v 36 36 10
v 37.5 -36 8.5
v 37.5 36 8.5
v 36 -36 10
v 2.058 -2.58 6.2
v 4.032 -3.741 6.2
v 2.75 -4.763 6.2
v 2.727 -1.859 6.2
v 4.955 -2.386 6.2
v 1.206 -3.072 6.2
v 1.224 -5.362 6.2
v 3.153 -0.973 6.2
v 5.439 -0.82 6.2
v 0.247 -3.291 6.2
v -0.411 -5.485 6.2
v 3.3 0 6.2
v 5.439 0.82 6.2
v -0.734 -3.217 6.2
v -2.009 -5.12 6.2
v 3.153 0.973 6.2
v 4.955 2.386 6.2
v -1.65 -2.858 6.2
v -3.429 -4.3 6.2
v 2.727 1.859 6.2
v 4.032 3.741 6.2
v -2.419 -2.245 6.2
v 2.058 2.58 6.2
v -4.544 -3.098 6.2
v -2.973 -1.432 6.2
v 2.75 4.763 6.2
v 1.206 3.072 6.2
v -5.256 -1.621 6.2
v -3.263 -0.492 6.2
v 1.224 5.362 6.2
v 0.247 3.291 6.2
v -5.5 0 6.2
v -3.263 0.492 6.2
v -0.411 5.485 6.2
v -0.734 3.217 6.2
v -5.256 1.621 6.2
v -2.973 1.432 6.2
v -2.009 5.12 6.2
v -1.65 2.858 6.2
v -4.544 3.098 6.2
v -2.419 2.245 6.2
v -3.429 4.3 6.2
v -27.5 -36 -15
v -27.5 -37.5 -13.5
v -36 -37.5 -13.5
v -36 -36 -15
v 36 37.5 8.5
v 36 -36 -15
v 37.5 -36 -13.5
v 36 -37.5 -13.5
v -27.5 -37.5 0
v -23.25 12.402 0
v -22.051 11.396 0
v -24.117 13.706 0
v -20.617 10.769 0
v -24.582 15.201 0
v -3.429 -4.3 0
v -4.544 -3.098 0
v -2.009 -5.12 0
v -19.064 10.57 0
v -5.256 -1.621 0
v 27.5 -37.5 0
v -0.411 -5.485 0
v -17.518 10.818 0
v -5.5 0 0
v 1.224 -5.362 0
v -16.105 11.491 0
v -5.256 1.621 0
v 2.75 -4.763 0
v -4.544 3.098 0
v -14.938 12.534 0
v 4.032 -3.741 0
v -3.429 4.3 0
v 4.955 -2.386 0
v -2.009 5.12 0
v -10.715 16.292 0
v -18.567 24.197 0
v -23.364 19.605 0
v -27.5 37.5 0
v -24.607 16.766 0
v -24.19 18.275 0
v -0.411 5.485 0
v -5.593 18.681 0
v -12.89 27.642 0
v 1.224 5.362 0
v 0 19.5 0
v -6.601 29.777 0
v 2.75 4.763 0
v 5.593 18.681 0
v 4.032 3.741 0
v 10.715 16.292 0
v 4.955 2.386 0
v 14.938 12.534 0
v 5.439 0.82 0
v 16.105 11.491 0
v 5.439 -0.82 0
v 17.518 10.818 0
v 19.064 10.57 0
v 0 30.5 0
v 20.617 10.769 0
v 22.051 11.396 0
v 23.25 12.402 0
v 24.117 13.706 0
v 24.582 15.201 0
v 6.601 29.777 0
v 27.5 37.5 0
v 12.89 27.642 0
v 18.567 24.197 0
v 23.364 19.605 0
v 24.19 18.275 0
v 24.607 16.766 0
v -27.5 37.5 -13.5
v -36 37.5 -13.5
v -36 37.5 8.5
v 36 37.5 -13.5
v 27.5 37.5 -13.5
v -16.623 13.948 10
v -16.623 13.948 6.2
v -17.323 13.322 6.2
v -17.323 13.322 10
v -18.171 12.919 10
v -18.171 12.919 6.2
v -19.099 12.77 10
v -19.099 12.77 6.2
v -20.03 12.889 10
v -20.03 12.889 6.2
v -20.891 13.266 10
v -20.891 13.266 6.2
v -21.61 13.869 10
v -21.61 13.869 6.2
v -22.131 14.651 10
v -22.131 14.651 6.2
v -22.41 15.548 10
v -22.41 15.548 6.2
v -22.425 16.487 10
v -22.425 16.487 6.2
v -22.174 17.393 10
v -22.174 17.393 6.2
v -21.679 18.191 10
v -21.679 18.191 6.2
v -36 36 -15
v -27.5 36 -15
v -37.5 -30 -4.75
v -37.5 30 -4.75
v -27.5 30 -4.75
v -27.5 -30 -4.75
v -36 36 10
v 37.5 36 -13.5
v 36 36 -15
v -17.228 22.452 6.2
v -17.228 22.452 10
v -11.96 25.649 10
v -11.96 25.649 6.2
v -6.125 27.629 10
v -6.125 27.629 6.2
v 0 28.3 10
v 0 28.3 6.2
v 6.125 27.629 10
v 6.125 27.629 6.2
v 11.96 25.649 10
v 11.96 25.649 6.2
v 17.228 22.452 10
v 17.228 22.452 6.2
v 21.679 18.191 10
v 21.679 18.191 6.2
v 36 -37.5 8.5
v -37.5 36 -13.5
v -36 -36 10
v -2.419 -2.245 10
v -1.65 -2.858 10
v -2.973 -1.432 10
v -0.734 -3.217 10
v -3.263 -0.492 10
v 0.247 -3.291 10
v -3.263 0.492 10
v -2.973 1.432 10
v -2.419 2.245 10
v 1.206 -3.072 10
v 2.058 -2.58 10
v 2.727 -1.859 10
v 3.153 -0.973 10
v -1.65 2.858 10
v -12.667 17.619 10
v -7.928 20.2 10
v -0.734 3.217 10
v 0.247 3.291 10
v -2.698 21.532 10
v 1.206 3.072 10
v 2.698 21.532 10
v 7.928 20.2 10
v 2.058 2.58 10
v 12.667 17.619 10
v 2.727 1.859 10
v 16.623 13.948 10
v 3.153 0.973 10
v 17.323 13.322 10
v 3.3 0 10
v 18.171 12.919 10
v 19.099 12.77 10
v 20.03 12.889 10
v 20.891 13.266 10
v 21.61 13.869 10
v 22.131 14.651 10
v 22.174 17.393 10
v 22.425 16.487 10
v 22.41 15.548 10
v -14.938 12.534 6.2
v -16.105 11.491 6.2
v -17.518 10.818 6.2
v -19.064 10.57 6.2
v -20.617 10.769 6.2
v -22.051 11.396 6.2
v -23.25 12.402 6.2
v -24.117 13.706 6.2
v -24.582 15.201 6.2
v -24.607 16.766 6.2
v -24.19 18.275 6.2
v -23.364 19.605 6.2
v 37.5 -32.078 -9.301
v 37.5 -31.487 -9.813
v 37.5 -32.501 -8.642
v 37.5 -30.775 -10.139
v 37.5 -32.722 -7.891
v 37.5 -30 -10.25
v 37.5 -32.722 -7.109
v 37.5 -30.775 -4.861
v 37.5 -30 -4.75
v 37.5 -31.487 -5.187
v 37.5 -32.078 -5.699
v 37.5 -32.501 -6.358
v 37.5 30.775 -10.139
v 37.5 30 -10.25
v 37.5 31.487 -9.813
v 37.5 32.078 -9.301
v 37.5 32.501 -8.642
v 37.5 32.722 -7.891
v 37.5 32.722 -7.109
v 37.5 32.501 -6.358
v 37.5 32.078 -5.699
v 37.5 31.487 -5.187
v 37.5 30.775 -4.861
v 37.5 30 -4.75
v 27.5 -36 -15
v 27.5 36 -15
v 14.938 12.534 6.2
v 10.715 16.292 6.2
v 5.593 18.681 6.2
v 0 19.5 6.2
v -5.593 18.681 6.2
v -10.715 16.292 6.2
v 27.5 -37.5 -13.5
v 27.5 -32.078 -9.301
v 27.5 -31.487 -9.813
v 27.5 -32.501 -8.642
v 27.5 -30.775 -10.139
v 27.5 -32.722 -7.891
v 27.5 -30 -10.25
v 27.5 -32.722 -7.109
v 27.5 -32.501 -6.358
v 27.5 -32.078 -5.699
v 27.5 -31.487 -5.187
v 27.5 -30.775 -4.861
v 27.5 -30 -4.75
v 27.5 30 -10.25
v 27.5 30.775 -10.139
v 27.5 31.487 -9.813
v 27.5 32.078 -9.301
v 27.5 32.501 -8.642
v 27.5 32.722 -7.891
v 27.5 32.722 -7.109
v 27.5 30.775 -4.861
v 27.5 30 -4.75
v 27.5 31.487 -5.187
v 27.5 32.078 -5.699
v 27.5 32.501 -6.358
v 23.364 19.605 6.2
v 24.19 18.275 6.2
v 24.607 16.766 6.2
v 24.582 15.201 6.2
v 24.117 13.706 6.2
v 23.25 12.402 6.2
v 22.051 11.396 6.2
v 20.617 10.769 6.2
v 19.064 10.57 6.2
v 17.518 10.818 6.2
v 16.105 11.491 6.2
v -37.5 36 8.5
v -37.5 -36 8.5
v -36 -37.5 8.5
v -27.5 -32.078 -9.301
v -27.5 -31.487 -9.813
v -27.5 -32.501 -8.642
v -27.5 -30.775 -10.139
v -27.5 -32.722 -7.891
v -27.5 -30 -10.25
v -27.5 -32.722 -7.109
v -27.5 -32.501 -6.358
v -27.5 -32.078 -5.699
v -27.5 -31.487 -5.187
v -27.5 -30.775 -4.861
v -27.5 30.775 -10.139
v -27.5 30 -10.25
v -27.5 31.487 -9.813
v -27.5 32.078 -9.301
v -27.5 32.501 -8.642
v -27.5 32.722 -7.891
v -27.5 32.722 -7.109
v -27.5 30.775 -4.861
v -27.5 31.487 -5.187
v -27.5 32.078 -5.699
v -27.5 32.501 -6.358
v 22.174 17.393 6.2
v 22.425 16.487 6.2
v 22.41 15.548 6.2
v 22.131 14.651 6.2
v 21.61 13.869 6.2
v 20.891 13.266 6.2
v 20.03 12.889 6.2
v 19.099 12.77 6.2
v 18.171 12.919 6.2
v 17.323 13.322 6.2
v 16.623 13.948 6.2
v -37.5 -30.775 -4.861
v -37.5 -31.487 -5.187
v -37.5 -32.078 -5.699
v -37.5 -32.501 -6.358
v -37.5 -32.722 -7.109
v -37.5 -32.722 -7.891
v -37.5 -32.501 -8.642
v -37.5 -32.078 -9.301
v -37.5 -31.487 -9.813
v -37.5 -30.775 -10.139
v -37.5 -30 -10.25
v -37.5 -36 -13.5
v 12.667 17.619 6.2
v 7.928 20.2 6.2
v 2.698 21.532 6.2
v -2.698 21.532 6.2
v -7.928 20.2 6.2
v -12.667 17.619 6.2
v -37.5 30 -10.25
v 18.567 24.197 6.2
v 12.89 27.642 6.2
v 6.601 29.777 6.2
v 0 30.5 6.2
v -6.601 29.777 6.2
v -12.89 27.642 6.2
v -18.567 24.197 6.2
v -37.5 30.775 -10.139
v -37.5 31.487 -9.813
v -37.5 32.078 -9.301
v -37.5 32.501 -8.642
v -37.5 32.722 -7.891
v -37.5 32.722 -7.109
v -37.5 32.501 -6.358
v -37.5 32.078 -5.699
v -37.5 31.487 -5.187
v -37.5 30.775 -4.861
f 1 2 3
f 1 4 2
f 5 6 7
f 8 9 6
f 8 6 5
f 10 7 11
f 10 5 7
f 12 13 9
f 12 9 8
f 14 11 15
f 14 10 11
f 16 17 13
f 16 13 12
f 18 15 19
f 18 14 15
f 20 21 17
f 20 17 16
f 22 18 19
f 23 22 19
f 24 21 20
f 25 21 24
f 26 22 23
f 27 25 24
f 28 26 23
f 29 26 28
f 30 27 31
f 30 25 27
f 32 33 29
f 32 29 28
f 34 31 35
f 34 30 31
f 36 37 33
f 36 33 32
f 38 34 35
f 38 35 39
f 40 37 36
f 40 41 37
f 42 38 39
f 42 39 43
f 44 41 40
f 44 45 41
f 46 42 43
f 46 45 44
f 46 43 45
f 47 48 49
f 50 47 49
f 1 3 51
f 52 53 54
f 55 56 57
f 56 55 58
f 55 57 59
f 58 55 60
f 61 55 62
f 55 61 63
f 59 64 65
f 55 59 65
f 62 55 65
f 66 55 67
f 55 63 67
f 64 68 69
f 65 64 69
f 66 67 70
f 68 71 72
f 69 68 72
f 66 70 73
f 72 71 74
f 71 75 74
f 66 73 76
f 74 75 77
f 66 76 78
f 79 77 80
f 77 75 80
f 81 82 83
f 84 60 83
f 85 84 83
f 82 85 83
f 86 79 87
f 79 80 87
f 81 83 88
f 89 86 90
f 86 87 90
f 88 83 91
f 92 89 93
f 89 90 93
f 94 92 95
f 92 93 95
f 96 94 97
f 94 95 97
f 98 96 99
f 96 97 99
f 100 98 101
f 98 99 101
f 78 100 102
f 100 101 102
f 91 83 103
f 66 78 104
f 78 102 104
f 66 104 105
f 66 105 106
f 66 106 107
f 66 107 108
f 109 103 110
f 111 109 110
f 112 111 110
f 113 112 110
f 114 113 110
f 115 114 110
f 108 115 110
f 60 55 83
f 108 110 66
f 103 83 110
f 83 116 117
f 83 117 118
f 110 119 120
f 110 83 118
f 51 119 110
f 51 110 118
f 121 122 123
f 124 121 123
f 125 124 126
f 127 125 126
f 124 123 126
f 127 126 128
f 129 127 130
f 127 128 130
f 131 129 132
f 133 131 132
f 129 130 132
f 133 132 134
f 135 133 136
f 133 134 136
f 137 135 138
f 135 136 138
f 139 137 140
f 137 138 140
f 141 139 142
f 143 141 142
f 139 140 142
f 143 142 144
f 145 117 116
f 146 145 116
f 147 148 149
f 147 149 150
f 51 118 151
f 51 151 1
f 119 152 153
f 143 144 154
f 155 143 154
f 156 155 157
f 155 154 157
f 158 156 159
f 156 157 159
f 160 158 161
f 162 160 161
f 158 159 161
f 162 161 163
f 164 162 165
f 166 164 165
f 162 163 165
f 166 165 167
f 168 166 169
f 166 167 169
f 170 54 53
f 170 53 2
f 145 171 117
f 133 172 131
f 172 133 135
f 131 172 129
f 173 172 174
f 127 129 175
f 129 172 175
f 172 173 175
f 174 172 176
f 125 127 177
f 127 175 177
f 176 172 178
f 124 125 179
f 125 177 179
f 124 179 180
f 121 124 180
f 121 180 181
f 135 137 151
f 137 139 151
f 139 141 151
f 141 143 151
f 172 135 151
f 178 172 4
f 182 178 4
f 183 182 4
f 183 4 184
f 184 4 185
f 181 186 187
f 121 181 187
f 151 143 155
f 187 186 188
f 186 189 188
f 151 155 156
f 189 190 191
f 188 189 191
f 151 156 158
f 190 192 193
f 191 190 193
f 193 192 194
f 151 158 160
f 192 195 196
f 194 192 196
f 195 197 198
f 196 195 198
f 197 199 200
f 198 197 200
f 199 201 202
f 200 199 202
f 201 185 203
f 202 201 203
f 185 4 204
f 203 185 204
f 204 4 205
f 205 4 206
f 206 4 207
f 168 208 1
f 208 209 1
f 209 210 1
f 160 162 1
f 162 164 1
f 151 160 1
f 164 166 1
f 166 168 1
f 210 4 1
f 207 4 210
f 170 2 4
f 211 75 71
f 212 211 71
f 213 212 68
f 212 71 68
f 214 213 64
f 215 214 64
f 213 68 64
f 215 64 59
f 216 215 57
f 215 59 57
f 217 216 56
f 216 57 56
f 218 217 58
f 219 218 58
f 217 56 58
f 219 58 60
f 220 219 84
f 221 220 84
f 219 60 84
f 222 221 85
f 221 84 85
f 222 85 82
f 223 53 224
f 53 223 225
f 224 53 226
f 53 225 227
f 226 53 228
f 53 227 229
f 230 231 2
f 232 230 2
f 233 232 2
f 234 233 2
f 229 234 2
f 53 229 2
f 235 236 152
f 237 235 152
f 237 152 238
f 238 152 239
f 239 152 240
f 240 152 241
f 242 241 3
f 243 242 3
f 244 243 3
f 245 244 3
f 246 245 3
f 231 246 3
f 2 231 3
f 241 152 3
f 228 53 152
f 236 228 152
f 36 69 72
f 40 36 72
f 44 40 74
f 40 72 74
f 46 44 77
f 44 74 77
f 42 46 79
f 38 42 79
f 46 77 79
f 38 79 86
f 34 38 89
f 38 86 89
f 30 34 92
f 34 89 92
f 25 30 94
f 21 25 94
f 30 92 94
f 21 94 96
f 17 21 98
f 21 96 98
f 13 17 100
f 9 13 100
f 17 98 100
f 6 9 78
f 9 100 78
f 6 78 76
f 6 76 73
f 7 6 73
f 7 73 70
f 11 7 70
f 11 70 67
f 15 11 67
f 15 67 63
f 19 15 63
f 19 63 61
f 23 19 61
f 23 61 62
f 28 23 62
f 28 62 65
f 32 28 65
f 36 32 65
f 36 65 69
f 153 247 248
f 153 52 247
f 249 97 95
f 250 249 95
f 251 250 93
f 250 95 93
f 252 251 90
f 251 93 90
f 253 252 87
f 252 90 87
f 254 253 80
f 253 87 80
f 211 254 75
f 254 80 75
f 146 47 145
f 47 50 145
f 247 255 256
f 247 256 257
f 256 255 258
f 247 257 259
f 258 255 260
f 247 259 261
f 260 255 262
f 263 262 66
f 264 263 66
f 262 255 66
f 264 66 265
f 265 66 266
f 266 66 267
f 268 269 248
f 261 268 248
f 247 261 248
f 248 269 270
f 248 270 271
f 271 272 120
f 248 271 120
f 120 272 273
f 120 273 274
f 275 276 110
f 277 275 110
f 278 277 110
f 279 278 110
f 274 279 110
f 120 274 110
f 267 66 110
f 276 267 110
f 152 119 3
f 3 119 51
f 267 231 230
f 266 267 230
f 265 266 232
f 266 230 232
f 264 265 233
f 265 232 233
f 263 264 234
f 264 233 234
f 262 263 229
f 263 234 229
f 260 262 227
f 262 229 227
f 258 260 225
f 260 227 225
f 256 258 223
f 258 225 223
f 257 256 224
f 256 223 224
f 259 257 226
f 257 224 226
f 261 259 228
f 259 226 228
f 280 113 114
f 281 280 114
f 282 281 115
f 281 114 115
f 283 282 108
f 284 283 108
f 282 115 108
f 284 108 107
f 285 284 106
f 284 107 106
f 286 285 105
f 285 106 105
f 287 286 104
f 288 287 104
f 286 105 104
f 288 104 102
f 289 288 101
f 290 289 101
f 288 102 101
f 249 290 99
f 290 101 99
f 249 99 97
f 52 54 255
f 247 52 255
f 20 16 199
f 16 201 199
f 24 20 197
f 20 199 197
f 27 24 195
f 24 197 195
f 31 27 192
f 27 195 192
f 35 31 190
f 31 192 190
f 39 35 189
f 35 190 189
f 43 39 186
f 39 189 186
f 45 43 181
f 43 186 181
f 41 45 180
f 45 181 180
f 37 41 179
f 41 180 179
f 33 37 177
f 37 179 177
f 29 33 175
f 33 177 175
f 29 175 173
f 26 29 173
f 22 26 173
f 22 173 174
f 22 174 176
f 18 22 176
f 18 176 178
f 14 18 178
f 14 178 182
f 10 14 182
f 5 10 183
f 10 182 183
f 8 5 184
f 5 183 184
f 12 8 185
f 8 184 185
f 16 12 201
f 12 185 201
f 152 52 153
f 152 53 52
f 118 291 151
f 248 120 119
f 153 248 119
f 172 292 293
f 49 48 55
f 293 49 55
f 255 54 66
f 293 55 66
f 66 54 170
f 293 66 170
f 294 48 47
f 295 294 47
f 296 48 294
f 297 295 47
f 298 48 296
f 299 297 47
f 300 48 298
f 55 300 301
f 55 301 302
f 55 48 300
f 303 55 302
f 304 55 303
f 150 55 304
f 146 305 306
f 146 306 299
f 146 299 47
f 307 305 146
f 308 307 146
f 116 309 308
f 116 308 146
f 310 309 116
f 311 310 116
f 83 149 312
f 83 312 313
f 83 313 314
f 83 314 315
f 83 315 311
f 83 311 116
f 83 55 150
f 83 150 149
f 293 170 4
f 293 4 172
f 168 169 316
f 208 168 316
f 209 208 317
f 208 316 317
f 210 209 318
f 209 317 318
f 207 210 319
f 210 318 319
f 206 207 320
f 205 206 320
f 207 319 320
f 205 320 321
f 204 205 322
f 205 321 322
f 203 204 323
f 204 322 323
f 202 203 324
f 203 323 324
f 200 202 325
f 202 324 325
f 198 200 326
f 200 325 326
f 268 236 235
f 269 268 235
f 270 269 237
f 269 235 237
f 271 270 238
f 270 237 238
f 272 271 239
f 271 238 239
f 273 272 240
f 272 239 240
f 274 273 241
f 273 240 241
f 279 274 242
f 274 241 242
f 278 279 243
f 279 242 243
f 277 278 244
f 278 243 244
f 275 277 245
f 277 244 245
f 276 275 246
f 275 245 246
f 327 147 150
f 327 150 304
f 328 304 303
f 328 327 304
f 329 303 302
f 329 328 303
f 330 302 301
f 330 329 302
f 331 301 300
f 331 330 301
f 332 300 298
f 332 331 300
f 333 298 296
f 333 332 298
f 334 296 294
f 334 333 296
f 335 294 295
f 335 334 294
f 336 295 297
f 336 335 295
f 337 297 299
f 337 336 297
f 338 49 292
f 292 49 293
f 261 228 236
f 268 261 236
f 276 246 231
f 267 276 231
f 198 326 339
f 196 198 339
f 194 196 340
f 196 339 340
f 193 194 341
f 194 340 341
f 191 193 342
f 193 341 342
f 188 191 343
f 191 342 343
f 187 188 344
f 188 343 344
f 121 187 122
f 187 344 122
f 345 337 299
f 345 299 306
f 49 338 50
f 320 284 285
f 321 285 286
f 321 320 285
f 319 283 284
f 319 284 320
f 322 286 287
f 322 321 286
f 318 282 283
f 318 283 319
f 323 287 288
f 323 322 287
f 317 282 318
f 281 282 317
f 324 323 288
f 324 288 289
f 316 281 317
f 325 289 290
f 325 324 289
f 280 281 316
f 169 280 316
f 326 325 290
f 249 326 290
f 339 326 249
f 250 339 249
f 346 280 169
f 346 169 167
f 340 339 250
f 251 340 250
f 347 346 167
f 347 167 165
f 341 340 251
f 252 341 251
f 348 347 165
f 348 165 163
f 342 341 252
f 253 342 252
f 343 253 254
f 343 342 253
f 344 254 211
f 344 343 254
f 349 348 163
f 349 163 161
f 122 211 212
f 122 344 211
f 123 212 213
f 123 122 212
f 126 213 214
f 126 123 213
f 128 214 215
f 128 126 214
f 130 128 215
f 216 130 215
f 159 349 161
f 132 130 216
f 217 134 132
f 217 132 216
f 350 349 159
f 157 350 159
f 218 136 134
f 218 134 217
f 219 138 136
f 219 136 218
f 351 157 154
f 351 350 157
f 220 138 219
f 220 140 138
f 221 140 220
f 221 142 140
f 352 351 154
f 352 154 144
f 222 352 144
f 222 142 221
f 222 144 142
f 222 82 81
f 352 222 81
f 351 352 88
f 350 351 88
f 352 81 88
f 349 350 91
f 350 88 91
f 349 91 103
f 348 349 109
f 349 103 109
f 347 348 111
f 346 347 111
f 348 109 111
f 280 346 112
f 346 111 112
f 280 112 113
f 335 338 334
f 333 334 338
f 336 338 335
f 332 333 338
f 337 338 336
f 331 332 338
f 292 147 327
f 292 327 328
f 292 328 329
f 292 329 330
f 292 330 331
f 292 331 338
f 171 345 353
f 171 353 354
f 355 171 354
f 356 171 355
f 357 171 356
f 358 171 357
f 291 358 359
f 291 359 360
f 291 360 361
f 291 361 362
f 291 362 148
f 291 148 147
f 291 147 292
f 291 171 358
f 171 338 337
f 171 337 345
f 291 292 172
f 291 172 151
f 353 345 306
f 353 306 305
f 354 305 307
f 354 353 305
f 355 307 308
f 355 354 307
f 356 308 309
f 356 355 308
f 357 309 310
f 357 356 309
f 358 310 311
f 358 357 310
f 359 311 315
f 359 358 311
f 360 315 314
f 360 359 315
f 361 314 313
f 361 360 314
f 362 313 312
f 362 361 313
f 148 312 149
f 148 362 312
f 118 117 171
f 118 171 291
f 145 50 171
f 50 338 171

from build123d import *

# Parameters (mm, degrees)
SKETCH1_W                                           = 65
SKETCH1_H                                           = 75
BOSS_EXTRUDE1_DEPTH                                 = 10
SKETCH2_W                                           = 5
SKETCH2_H                                           = 75
BOSS_EXTRUDE2_DEPTH                                 = 15
CUT_EXTRUDE1_DEPTH                                  = 109
CUT_EXTRUDE3_DEPTH                                  = 6.2
CUT_EXTRUDE4_DEPTH                                  = 48.4
CBORE_FOR_M6_HEX_SOCKET_HEAD_CAP_SCREW1_D           = 6.6
CBORE_FOR_M6_HEX_SOCKET_HEAD_CAP_SCREW1_CBORE_D     = 11
CBORE_FOR_M6_HEX_SOCKET_HEAD_CAP_SCREW1_CBORE_DEPTH = 6.2
BOSS_EXTRUDE3_START                                 = 5
SKETCH9_W                                           = 25
SKETCH9_H                                           = 75
BOSS_EXTRUDE3_DEPTH                                 = 5
CHAMFER1_SIZE                                       = 1.5


with BuildPart() as part:
    # Sketch1 → Boss-Extrude1 (new body)
    with BuildSketch(Plane.XY):
        Rectangle(SKETCH1_W, SKETCH1_H)
    extrude(amount=BOSS_EXTRUDE1_DEPTH)

    # Sketch2 → Boss-Extrude2 (add)
    with BuildSketch(Plane(origin=(0, 0, 0), x_dir=(-1, 0, 0), z_dir=(0, 0, -1))):
        with Locations((-30, 0)):
            Rectangle(SKETCH2_W, SKETCH2_H)
        with Locations((30, 0)):
            Rectangle(SKETCH2_W, SKETCH2_H)
    extrude(amount=BOSS_EXTRUDE2_DEPTH)

    # Sketch3 → Cut-Extrude1 (cut)
    with BuildSketch(Plane.ZY.offset(32.5)):
        with BuildLine():
            Line((-4.75, 30), (-4.75, -30))
            ThreePointArc((-4.75, -30), (-7.5, -32.75), (-10.25, -30))
            Line((-10.25, -30), (-10.25, 30))
            ThreePointArc((-10.25, 30), (-7.5, 32.75), (-4.75, 30))
        make_face()
    extrude(amount=-CUT_EXTRUDE1_DEPTH, mode=Mode.SUBTRACT)

    # Sketch4 → Cut-Extrude3 (cut)
    with BuildSketch(Plane(origin=(0, 0, 0), x_dir=(-1, 0, 0), z_dir=(0, 0, -1))):
        with BuildLine():
            ThreePointArc((-23.364355515, 19.605022095), (-22.686442931, 11.856445805), (-14.937866641, 12.534358389))
            ThreePointArc((-14.937866641, 12.534358389), (0, 19.5), (14.937866641, 12.534358389))
            ThreePointArc((14.937866641, 12.534358389), (22.686442931, 11.856445805), (23.364355515, 19.605022095))
            ThreePointArc((23.364355515, 19.605022095), (0, 30.5), (-23.364355515, 19.605022095))
        make_face()
    extrude(amount=-CUT_EXTRUDE3_DEPTH, mode=Mode.SUBTRACT)

    # Sketch5 → Cut-Extrude4 (cut)
    with BuildSketch(Plane(origin=(0, 0, 0), x_dir=(-1, 0, 0), z_dir=(0, 0, -1))):
        with BuildLine():
            ThreePointArc((-21.67905774, 18.190889354), (-21.27231019, 13.54174358), (-16.623164416, 13.94849113))
            ThreePointArc((-16.623164416, 13.94849113), (0, 21.7), (16.623164416, 13.94849113))
            ThreePointArc((16.623164416, 13.94849113), (21.27231019, 13.54174358), (21.67905774, 18.190889354))
            ThreePointArc((21.67905774, 18.190889354), (0, 28.3), (-21.67905774, 18.190889354))
        make_face()
    extrude(amount=-CUT_EXTRUDE4_DEPTH, mode=Mode.SUBTRACT)

    # CBORE for M6 Hex Socket Head Cap Screw1 (through all)
    with Locations(Plane(origin=(0, 0, 0), x_dir=(-1, 0, 0), z_dir=(0, 0, -1))):
        with Locations((0, 0)):
            CounterBoreHole(CBORE_FOR_M6_HEX_SOCKET_HEAD_CAP_SCREW1_D / 2, CBORE_FOR_M6_HEX_SOCKET_HEAD_CAP_SCREW1_CBORE_D / 2, CBORE_FOR_M6_HEX_SOCKET_HEAD_CAP_SCREW1_CBORE_DEPTH)

    # Sketch9 → Boss-Extrude3 (add)
    with BuildSketch(Plane.ZY.offset(32.5).offset(BOSS_EXTRUDE3_START)):
        with Locations((-2.5, 0)):
            Rectangle(SKETCH9_W, SKETCH9_H)
        with BuildLine():
            Line((-4.75, 30), (-4.75, -30))
            ThreePointArc((-4.75, -30), (-7.5, -32.75), (-10.25, -30))
            Line((-10.25, -30), (-10.25, 30))
            ThreePointArc((-10.25, 30), (-7.5, 32.75), (-4.75, 30))
        make_face(mode=Mode.SUBTRACT)
    boss_extrude3 = extrude(amount=-BOSS_EXTRUDE3_DEPTH)

    # Mirror1: Boss-Extrude3 across plane
    add(boss_extrude3.mirror(Plane.ZY))

    # Chamfer1
    chamfer1_edges = [part.edges().sort_by_distance(p)[0] for p in [
        (-37.5, 0, -15),
        (-37.5, -37.5, -2.5),
        (-37.5, 0, 10),
        (-37.5, 37.5, -2.5),
        (37.5, 0, -15),
        (37.5, 37.5, -2.5),
        (37.5, 0, 10),
        (37.5, -37.5, -2.5),
        (0, -37.5, 10),
        (32.5, -37.5, -15),
        (32.5, 37.5, -15),
        (-32.5, 37.5, -15),
        (-32.5, -37.5, -15),
        (0, 37.5, 10),
    ]]
    chamfer(chamfer1_edges, length=CHAMFER1_SIZE)


solid = part.part
